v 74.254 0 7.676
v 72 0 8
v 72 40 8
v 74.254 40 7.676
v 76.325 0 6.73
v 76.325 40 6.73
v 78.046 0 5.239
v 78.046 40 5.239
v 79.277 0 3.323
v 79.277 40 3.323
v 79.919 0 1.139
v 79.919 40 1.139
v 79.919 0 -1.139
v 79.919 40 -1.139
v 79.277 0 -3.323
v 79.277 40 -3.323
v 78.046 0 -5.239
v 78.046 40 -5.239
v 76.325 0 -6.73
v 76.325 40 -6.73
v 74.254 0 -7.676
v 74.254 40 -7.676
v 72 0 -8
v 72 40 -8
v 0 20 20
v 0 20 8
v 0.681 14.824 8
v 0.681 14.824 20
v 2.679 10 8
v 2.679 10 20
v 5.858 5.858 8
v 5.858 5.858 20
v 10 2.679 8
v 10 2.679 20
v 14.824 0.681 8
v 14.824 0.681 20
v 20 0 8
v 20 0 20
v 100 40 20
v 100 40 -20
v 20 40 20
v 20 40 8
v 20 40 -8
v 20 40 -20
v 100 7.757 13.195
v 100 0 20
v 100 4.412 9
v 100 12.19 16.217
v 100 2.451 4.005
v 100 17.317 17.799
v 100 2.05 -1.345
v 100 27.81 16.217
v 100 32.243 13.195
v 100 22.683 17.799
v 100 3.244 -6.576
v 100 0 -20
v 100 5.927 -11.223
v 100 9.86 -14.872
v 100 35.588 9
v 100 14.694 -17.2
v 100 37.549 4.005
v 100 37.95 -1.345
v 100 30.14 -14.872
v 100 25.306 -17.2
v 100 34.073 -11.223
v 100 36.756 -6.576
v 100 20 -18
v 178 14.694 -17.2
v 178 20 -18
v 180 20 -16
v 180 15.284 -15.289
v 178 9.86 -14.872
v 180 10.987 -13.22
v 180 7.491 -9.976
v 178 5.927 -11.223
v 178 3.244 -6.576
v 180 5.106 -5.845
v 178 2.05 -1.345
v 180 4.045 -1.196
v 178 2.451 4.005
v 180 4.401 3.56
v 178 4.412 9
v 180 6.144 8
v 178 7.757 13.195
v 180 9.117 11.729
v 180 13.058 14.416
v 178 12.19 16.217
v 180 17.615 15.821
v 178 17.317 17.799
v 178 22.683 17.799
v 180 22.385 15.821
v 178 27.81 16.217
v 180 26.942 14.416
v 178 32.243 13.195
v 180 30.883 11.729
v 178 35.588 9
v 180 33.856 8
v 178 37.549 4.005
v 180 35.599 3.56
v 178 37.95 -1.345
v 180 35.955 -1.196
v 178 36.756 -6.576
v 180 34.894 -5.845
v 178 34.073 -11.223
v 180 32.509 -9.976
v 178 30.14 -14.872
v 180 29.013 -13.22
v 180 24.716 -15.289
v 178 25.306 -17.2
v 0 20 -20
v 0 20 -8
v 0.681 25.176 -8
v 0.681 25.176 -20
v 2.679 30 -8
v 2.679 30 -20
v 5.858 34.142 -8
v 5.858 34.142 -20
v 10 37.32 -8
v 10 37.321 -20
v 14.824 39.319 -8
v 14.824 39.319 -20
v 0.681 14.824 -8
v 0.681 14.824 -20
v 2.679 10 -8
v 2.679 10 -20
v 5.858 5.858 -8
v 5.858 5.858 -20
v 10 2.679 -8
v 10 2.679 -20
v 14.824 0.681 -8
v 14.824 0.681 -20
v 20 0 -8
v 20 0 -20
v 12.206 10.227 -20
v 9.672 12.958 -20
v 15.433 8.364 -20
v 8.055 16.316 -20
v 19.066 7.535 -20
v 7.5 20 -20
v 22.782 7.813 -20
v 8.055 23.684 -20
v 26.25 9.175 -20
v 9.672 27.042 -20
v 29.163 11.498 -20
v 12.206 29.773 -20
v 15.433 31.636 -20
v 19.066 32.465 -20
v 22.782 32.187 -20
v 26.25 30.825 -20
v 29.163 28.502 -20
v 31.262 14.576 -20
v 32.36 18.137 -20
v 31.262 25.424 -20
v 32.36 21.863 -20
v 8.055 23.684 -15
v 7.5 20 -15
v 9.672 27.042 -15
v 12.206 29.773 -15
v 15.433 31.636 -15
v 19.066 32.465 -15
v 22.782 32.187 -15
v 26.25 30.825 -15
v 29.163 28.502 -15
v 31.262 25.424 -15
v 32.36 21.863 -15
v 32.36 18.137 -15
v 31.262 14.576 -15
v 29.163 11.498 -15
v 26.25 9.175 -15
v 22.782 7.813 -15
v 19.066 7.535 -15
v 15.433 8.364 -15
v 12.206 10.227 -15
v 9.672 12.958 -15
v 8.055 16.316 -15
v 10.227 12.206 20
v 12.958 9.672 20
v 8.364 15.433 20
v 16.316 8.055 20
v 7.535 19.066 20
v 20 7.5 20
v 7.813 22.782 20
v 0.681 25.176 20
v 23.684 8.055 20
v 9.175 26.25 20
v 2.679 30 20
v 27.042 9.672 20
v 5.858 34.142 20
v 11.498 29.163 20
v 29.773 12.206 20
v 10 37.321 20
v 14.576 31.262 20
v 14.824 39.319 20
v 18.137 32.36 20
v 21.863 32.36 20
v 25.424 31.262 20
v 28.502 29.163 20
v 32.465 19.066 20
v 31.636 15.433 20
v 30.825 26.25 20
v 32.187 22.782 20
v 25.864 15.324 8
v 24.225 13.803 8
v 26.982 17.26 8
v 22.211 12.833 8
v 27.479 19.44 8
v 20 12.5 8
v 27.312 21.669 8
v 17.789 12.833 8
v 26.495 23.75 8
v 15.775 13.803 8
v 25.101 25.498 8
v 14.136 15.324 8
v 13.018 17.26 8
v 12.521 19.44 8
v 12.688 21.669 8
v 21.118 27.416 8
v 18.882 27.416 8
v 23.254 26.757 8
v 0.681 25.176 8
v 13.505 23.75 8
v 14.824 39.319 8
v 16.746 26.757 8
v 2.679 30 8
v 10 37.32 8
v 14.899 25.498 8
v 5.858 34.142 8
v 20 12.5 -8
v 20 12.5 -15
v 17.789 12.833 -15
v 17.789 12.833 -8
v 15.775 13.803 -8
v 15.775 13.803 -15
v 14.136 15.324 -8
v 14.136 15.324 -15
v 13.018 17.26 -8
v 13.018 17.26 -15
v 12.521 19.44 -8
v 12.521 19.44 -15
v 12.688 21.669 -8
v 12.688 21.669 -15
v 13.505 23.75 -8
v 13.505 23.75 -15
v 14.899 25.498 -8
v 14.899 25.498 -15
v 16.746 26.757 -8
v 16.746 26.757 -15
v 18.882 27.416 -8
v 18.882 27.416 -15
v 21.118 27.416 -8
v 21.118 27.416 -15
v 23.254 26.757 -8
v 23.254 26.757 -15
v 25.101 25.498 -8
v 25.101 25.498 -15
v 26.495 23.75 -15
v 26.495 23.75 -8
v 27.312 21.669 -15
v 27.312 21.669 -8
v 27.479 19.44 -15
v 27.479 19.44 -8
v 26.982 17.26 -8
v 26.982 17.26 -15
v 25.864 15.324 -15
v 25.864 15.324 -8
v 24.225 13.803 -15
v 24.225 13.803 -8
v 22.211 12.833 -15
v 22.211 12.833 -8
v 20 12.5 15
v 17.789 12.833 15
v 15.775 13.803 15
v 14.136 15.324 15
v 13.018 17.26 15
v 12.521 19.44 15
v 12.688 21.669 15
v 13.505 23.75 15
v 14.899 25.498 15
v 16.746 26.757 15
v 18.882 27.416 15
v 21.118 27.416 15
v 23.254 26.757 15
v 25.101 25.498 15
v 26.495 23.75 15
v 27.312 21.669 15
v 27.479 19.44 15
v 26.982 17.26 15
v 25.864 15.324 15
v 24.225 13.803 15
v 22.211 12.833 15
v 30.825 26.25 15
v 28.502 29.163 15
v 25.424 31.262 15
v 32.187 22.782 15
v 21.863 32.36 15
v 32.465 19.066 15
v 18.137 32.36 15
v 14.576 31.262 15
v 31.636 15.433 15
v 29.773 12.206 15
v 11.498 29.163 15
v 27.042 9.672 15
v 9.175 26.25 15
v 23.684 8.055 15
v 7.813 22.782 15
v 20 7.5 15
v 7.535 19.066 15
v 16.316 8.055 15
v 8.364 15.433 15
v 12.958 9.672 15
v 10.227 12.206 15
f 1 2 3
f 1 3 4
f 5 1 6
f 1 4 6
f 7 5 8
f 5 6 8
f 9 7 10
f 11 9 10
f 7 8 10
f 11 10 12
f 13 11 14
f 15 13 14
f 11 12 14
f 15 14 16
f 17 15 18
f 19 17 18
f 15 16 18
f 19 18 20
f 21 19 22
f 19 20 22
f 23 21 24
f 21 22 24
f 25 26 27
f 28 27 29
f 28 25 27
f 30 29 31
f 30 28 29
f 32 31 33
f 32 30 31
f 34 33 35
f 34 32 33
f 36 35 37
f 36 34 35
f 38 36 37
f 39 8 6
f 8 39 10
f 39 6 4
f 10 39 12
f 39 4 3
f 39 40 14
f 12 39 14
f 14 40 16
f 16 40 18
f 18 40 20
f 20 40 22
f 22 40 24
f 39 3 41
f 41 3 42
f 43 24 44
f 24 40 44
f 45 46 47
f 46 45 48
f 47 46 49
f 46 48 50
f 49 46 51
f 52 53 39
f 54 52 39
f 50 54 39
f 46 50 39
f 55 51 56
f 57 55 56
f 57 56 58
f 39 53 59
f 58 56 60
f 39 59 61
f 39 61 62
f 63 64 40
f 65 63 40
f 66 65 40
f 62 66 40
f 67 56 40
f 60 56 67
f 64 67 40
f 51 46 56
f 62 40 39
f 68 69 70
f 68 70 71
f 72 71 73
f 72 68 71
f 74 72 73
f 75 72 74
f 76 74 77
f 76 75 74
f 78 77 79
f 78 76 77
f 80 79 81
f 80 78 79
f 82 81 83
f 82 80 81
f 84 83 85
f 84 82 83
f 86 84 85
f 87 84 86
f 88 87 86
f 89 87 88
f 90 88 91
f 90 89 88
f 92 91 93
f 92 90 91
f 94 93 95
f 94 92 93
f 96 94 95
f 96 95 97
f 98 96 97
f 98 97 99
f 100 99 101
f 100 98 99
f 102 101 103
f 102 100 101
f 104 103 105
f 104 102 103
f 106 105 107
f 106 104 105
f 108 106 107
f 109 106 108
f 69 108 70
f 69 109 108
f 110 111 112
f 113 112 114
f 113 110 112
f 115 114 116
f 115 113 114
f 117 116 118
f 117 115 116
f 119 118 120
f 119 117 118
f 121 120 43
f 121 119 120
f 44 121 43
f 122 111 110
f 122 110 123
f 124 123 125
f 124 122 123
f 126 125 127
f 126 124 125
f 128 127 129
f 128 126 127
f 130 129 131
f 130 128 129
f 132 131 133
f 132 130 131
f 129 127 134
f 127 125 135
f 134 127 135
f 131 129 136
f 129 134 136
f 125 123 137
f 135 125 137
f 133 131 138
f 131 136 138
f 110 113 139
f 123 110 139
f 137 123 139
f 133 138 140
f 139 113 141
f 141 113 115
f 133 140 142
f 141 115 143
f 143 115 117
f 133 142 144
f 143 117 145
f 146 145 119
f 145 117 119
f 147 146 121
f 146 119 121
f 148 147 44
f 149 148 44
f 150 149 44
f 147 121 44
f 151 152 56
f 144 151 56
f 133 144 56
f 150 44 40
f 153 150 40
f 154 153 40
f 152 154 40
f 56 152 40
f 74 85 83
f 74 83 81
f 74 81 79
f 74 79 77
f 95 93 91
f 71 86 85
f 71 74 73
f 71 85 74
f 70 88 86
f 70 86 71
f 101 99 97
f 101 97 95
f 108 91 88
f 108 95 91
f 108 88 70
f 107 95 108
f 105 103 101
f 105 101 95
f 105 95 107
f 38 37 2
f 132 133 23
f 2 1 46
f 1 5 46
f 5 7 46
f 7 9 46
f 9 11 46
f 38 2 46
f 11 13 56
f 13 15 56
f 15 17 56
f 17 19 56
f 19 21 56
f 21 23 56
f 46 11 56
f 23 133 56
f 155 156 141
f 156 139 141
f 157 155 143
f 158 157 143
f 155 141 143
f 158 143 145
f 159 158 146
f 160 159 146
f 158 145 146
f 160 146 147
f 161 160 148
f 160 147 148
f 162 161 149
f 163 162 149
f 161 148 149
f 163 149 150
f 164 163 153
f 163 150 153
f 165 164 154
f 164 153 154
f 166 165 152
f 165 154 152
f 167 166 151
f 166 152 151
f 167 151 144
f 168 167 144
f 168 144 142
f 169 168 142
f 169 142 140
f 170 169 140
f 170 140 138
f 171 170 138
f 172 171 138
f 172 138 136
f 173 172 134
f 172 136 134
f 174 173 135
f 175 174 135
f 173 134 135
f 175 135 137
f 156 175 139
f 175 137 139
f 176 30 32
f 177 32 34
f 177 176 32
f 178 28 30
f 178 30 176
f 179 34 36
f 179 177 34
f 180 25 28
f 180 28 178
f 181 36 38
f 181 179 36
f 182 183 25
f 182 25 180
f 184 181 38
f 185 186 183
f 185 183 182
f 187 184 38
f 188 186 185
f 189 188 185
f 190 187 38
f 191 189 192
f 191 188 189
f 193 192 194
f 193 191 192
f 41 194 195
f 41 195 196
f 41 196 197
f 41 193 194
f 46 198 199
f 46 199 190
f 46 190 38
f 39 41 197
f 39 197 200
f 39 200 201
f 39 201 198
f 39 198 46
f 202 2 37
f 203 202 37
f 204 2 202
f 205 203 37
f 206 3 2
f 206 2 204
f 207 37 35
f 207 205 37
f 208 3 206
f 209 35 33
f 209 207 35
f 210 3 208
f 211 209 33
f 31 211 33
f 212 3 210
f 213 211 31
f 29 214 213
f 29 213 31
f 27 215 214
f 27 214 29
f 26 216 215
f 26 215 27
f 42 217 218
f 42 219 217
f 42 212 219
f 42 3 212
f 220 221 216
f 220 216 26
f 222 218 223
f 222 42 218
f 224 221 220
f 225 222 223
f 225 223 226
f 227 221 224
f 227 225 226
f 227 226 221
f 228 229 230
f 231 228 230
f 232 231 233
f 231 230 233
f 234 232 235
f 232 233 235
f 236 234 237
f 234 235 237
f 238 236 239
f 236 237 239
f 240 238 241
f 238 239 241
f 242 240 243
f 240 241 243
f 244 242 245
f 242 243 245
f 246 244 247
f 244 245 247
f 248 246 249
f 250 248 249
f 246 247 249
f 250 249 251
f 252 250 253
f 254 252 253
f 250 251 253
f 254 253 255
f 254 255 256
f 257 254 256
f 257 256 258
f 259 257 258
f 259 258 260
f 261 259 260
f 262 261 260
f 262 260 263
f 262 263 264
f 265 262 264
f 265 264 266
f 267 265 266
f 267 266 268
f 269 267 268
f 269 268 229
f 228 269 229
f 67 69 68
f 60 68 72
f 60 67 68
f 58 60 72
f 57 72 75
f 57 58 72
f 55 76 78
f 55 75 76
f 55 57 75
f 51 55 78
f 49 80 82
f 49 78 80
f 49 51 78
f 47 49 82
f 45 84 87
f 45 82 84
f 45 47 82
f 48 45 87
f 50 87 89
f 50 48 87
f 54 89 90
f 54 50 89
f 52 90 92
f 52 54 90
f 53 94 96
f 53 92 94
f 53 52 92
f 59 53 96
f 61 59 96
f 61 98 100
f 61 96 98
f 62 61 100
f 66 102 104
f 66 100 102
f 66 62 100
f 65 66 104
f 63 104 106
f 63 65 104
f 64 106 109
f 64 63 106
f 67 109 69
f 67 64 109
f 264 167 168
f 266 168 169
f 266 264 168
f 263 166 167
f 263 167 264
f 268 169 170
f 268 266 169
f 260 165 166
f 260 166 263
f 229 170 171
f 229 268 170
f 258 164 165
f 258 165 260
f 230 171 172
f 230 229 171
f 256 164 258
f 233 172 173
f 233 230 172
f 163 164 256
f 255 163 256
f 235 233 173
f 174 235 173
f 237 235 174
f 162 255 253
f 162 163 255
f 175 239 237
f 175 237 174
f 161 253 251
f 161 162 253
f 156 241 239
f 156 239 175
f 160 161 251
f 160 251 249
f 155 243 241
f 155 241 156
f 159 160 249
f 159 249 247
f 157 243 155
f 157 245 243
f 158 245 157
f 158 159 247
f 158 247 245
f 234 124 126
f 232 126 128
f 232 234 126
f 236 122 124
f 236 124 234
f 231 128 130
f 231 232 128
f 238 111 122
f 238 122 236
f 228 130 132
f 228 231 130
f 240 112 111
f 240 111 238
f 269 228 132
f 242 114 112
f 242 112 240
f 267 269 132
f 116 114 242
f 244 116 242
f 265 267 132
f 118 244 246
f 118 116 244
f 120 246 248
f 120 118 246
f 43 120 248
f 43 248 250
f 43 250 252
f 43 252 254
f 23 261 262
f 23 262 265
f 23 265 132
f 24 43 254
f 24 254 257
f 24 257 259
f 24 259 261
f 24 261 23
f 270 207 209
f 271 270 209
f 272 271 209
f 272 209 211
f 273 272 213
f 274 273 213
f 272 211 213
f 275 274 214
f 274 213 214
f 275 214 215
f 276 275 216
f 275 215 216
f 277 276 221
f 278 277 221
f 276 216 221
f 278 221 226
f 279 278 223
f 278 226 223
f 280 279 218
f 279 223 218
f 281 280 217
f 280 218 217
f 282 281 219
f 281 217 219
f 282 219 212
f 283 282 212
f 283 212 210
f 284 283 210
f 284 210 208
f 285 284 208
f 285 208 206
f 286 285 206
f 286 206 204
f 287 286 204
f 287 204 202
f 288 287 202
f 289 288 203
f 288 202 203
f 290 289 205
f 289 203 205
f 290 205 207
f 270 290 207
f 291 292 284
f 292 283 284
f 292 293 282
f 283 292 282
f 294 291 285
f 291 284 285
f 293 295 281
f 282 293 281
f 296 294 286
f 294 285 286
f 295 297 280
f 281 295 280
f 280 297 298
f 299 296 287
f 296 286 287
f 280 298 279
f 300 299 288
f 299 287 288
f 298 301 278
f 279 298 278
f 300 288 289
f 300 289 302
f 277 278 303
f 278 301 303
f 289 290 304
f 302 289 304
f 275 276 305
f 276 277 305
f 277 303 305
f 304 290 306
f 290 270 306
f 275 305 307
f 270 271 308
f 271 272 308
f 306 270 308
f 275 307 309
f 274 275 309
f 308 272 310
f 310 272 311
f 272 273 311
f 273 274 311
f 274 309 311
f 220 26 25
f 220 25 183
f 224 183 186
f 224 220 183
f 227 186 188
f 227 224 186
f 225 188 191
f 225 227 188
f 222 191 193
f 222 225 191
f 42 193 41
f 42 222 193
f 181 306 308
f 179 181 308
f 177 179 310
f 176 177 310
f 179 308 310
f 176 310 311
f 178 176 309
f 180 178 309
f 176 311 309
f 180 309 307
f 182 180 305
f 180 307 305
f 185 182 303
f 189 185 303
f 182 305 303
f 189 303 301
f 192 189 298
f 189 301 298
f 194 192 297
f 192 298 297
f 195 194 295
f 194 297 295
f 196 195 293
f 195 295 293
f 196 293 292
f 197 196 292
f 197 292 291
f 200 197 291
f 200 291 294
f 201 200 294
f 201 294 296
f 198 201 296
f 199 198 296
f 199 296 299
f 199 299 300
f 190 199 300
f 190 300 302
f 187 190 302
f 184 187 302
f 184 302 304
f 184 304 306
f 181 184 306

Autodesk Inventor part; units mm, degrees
ref_plane "YZ Plane" through (0, 0, 0) normal (1, 0, 0) x (0, 1, 0)
ref_plane "XZ Plane" through (0, 0, 0) normal (0, 1, 0) x (-1, 0, 0)
ref_plane "XY Plane" through (0, 0, 0) normal (0, 0, 1) x (1, 0, 0)
sketch "Sketch1" plane through (0, 0, 0) normal (0, 0, 1) x (1, 0, 0)
  line L0 (0, 0) -> (100, 0)
  line L1 (100, 0) -> (100, 40)
  line L2 (100, 40) -> (0, 40)
  line L3 (0, 40) -> (0, 0)
  dimension "d0" = 100
  dimension "d1" = 40
extrude "Extrusion1" add sketch "Sketch1" along normal mid plane 40
sketch "Sketch2" plane through (100, 0, 20) normal (1, 0, 0) x (0, 0, -1)
  line L0 (40, 40) -> (0, 40) projected
  circle A0 centre (20, 20) radius 18
  point P0 (20, 0)
  dimension "d5" = 36
extrude "Extrusion2" add sketch "Sketch2" along normal blind 80
thread "Thread1" size "M36x4" class "6g" standard "ANSI Metric M Profile" length 80 offset 33
chamfer "Chamfer1" distance 2 angle 45 1 edges at (180, 20, 18)
sketch "Sketch3" plane through (0, 0, 20) normal (0, 0, 1) x (1, 0, 0)
  line L0 (0, 0) -> (100, 0) projected
  line L1 (100, 40) -> (0, 40) projected
  circle A0 centre (20, 20) radius 7.5
  circle A1 centre (20, 20) radius 12.5
  line L2 (100, 0) -> (100, 40) projected
  dimension "d13" = 80
  dimension "d14" = 15
  dimension "d15" = 25
hole "Hole1" at (20, 20, 20) direction (0, 0, -1) diameter 15 end through all counterbore diameter 25 counterbore depth 5
fillet "Fillet1" radius 20 1 edges at (0, 40, 0)
fillet "Fillet2" radius 20 1 edges at (0, 0, 0)
sketch "Sketch9" plane through (100, 40, 20) normal (0, 1, 0) x (1, 0, 0)
  line L0 (0, 0) -> (-80, 0) projected
  line L1 (-28, 0) -> (-28, 39.5262)
  line L2 (0, 40) -> (0, 0) projected
  line L3 (-108, 28) -> (-28, 28)
  line L4 (-28, 28) -> (-28, 12)
  line L5 (-28, 12) -> (-108, 12)
  line L6 (-108, 12) -> (-108, 28)
  line L7 (-80, 40) -> (0, 40) projected
  circle A0 centre (-28, 20) radius 8
  point P0 (-100, 20)
  point P1 (-68, 12)
  point P2 (-28, 12)
  point P3 (-28, 28)
  dimension "d37" = 28
  dimension "d38" = 0
  dimension "d39" = 12
  dimension "d40" = 16
  dimension "d41" = 16
  dimension "d42" = 80
  dimension "d43" = 16
extrude "Extrusion5" cut sketch "Sketch9" against normal blind 40
sketch "Sketch12" plane through (0, 0, -20) normal (0, 0, -1) x (-1, 0, 0)
  line L0 (-20, 0) -> (-100, 0) projected
  circle A0 centre (-20, 20) radius 12.5 projected
  circle A1 centre (-20, 20) radius 12.5
  point P0 (0, 0)
extrude "Extrusion6" cut sketch "Sketch12" against normal blind 5
properties part number "Partultimaparte"
